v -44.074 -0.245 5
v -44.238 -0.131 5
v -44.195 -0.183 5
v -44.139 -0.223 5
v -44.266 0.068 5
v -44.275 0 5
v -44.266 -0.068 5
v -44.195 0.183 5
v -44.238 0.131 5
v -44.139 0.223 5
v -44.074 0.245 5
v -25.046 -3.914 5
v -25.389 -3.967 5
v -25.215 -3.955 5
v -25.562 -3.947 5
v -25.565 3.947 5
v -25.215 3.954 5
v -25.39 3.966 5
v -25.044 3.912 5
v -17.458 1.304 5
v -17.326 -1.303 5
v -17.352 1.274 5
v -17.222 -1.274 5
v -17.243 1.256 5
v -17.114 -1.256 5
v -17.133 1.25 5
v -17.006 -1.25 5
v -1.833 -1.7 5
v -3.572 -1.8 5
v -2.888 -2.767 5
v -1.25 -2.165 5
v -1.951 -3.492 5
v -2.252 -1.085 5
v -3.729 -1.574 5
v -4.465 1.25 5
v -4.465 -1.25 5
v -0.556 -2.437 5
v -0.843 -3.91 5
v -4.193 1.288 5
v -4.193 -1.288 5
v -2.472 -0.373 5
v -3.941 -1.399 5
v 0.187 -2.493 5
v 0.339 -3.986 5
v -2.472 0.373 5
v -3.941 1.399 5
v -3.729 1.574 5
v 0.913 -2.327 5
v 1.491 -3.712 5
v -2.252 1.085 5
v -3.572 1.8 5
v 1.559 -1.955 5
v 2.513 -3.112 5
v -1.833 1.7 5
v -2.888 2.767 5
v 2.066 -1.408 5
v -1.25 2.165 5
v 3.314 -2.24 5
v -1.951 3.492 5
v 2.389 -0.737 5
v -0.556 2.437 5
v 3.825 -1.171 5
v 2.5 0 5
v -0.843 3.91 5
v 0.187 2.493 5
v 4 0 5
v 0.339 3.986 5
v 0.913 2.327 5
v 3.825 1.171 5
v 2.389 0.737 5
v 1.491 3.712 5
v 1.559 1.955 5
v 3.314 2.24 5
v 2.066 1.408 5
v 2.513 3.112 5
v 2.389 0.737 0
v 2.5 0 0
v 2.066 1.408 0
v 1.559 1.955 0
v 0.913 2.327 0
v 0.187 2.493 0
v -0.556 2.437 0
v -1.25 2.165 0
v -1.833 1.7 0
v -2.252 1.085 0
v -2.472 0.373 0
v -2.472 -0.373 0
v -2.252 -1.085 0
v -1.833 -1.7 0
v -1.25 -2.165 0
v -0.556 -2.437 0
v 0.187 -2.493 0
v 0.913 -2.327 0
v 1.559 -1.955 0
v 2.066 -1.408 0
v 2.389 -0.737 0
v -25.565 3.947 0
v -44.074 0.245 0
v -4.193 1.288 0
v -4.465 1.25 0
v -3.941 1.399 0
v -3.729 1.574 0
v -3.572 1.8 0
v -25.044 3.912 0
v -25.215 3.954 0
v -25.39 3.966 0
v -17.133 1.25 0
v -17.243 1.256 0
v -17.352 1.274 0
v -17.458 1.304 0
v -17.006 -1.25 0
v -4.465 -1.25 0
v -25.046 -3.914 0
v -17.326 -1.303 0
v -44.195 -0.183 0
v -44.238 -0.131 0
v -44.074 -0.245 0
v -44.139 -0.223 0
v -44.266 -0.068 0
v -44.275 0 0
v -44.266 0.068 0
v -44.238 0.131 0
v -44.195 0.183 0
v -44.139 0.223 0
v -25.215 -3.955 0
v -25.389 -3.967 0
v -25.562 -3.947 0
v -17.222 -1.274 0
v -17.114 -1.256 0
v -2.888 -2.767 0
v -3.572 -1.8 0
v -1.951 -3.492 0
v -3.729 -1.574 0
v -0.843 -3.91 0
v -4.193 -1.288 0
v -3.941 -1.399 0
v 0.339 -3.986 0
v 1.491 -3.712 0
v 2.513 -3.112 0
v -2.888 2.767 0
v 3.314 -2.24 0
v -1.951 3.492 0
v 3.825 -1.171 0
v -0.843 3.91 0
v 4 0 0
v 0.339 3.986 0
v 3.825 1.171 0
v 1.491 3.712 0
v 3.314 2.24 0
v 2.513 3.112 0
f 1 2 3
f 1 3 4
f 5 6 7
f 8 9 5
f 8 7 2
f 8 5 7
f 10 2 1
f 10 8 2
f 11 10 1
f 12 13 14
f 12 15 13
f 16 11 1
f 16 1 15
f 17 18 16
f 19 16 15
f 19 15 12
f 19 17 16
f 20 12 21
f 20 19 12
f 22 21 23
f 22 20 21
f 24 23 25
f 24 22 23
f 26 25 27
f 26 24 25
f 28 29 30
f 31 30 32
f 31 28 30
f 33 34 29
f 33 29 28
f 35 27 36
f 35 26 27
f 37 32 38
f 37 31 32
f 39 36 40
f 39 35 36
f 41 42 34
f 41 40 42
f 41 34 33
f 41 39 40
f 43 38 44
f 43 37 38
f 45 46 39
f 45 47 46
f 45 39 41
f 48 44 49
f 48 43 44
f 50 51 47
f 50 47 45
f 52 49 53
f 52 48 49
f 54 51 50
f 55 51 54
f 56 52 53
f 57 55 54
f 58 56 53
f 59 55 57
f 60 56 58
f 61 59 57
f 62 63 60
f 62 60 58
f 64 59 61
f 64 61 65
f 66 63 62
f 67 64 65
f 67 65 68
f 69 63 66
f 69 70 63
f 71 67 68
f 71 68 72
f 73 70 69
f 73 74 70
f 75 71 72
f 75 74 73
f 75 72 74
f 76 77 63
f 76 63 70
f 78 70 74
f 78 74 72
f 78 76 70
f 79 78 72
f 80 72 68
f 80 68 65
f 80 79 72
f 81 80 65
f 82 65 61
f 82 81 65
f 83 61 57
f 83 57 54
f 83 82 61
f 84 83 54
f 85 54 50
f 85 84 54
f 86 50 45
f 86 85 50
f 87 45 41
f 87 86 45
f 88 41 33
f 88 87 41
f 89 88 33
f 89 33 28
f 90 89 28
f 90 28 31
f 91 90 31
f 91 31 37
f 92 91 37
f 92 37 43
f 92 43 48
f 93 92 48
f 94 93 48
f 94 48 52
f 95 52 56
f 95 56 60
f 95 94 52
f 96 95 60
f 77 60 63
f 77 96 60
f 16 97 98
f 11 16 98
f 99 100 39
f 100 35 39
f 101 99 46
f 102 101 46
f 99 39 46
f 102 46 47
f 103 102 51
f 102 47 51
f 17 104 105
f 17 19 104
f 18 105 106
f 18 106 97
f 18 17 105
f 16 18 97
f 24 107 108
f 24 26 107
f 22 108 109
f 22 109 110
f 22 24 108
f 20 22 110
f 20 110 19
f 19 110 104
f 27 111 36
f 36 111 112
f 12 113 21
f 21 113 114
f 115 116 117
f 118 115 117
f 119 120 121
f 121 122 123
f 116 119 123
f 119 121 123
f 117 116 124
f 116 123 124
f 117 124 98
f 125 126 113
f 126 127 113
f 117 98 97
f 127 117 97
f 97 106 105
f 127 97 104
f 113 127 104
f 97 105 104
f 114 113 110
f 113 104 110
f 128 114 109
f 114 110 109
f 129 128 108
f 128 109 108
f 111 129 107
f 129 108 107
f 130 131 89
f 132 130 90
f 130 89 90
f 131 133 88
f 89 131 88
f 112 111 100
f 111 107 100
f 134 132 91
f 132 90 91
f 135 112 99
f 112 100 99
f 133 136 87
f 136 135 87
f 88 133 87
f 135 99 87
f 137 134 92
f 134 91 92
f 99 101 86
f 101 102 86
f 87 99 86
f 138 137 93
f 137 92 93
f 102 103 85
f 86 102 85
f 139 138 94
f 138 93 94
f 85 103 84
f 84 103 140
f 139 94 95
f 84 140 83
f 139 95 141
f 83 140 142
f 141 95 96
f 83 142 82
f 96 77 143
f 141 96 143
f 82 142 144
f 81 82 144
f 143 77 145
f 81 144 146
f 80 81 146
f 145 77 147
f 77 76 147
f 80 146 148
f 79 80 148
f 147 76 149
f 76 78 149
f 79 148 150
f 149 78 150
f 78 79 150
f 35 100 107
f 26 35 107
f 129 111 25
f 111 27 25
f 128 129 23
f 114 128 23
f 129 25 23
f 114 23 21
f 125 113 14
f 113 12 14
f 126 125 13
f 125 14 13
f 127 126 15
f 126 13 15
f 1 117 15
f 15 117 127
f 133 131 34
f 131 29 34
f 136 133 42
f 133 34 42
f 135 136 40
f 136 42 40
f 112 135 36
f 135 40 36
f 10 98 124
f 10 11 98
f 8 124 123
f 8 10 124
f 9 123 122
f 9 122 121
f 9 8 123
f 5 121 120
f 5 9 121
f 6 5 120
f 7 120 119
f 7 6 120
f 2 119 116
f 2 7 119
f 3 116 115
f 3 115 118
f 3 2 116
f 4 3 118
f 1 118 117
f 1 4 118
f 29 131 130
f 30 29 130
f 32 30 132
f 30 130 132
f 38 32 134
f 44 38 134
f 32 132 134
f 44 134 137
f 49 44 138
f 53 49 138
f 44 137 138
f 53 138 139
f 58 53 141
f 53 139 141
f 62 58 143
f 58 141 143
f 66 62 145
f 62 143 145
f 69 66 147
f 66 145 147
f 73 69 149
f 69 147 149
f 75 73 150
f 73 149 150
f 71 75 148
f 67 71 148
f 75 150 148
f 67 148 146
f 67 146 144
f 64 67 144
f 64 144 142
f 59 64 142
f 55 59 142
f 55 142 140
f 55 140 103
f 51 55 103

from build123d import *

# Parameters (mm, degrees)
ESQUISSE1_R        = 2.5
BOSS_EXTRU_1_DEPTH = 5
CONG_1_R           = 1
CONG_2_R           = 0.25


with BuildPart() as part:
    # Esquisse1 → Boss.-Extru.1 (new body)
    with BuildSketch(Plane.XY):
        with BuildLine():
            Line((-3.799671038, 1.25), (-17.299671038, 1.25))
            Line((-17.299671038, 1.25), (-25.299671038, 4))
            Line((-25.299671038, 4), (-45.299671038, 0))
            Line((-45.299671038, 0), (-25.299671038, -4))
            Line((-25.299671038, -4), (-17.170505914, -1.25))
            Line((-17.170505914, -1.25), (-3.799671038, -1.25))
            ThreePointArc((-3.799671038, -1.25), (4, 0), (-3.799671038, 1.25))
        make_face()
        Circle(ESQUISSE1_R, mode=Mode.SUBTRACT)
    extrude(amount=BOSS_EXTRU_1_DEPTH)

    # Congé1
    cong_1_edges = [part.edges().sort_by_distance(p)[0] for p in [
        (-25.299671038, 4, 2.5),
        (-17.299671038, 1.25, 2.5),
        (-3.799671038, 1.25, 2.5),
        (-3.799671038, -1.25, 2.5),
        (-17.170505914, -1.25, 2.5),
        (-25.299671038, -4, 2.5),
    ]]
    fillet(cong_1_edges, radius=CONG_1_R)

    # Congé2
    cong_2_edges = [part.edges().sort_by_distance(p)[0] for p in [
        (-45.299671038, 0, 2.5),
    ]]
    fillet(cong_2_edges, radius=CONG_2_R)


solid = part.part
